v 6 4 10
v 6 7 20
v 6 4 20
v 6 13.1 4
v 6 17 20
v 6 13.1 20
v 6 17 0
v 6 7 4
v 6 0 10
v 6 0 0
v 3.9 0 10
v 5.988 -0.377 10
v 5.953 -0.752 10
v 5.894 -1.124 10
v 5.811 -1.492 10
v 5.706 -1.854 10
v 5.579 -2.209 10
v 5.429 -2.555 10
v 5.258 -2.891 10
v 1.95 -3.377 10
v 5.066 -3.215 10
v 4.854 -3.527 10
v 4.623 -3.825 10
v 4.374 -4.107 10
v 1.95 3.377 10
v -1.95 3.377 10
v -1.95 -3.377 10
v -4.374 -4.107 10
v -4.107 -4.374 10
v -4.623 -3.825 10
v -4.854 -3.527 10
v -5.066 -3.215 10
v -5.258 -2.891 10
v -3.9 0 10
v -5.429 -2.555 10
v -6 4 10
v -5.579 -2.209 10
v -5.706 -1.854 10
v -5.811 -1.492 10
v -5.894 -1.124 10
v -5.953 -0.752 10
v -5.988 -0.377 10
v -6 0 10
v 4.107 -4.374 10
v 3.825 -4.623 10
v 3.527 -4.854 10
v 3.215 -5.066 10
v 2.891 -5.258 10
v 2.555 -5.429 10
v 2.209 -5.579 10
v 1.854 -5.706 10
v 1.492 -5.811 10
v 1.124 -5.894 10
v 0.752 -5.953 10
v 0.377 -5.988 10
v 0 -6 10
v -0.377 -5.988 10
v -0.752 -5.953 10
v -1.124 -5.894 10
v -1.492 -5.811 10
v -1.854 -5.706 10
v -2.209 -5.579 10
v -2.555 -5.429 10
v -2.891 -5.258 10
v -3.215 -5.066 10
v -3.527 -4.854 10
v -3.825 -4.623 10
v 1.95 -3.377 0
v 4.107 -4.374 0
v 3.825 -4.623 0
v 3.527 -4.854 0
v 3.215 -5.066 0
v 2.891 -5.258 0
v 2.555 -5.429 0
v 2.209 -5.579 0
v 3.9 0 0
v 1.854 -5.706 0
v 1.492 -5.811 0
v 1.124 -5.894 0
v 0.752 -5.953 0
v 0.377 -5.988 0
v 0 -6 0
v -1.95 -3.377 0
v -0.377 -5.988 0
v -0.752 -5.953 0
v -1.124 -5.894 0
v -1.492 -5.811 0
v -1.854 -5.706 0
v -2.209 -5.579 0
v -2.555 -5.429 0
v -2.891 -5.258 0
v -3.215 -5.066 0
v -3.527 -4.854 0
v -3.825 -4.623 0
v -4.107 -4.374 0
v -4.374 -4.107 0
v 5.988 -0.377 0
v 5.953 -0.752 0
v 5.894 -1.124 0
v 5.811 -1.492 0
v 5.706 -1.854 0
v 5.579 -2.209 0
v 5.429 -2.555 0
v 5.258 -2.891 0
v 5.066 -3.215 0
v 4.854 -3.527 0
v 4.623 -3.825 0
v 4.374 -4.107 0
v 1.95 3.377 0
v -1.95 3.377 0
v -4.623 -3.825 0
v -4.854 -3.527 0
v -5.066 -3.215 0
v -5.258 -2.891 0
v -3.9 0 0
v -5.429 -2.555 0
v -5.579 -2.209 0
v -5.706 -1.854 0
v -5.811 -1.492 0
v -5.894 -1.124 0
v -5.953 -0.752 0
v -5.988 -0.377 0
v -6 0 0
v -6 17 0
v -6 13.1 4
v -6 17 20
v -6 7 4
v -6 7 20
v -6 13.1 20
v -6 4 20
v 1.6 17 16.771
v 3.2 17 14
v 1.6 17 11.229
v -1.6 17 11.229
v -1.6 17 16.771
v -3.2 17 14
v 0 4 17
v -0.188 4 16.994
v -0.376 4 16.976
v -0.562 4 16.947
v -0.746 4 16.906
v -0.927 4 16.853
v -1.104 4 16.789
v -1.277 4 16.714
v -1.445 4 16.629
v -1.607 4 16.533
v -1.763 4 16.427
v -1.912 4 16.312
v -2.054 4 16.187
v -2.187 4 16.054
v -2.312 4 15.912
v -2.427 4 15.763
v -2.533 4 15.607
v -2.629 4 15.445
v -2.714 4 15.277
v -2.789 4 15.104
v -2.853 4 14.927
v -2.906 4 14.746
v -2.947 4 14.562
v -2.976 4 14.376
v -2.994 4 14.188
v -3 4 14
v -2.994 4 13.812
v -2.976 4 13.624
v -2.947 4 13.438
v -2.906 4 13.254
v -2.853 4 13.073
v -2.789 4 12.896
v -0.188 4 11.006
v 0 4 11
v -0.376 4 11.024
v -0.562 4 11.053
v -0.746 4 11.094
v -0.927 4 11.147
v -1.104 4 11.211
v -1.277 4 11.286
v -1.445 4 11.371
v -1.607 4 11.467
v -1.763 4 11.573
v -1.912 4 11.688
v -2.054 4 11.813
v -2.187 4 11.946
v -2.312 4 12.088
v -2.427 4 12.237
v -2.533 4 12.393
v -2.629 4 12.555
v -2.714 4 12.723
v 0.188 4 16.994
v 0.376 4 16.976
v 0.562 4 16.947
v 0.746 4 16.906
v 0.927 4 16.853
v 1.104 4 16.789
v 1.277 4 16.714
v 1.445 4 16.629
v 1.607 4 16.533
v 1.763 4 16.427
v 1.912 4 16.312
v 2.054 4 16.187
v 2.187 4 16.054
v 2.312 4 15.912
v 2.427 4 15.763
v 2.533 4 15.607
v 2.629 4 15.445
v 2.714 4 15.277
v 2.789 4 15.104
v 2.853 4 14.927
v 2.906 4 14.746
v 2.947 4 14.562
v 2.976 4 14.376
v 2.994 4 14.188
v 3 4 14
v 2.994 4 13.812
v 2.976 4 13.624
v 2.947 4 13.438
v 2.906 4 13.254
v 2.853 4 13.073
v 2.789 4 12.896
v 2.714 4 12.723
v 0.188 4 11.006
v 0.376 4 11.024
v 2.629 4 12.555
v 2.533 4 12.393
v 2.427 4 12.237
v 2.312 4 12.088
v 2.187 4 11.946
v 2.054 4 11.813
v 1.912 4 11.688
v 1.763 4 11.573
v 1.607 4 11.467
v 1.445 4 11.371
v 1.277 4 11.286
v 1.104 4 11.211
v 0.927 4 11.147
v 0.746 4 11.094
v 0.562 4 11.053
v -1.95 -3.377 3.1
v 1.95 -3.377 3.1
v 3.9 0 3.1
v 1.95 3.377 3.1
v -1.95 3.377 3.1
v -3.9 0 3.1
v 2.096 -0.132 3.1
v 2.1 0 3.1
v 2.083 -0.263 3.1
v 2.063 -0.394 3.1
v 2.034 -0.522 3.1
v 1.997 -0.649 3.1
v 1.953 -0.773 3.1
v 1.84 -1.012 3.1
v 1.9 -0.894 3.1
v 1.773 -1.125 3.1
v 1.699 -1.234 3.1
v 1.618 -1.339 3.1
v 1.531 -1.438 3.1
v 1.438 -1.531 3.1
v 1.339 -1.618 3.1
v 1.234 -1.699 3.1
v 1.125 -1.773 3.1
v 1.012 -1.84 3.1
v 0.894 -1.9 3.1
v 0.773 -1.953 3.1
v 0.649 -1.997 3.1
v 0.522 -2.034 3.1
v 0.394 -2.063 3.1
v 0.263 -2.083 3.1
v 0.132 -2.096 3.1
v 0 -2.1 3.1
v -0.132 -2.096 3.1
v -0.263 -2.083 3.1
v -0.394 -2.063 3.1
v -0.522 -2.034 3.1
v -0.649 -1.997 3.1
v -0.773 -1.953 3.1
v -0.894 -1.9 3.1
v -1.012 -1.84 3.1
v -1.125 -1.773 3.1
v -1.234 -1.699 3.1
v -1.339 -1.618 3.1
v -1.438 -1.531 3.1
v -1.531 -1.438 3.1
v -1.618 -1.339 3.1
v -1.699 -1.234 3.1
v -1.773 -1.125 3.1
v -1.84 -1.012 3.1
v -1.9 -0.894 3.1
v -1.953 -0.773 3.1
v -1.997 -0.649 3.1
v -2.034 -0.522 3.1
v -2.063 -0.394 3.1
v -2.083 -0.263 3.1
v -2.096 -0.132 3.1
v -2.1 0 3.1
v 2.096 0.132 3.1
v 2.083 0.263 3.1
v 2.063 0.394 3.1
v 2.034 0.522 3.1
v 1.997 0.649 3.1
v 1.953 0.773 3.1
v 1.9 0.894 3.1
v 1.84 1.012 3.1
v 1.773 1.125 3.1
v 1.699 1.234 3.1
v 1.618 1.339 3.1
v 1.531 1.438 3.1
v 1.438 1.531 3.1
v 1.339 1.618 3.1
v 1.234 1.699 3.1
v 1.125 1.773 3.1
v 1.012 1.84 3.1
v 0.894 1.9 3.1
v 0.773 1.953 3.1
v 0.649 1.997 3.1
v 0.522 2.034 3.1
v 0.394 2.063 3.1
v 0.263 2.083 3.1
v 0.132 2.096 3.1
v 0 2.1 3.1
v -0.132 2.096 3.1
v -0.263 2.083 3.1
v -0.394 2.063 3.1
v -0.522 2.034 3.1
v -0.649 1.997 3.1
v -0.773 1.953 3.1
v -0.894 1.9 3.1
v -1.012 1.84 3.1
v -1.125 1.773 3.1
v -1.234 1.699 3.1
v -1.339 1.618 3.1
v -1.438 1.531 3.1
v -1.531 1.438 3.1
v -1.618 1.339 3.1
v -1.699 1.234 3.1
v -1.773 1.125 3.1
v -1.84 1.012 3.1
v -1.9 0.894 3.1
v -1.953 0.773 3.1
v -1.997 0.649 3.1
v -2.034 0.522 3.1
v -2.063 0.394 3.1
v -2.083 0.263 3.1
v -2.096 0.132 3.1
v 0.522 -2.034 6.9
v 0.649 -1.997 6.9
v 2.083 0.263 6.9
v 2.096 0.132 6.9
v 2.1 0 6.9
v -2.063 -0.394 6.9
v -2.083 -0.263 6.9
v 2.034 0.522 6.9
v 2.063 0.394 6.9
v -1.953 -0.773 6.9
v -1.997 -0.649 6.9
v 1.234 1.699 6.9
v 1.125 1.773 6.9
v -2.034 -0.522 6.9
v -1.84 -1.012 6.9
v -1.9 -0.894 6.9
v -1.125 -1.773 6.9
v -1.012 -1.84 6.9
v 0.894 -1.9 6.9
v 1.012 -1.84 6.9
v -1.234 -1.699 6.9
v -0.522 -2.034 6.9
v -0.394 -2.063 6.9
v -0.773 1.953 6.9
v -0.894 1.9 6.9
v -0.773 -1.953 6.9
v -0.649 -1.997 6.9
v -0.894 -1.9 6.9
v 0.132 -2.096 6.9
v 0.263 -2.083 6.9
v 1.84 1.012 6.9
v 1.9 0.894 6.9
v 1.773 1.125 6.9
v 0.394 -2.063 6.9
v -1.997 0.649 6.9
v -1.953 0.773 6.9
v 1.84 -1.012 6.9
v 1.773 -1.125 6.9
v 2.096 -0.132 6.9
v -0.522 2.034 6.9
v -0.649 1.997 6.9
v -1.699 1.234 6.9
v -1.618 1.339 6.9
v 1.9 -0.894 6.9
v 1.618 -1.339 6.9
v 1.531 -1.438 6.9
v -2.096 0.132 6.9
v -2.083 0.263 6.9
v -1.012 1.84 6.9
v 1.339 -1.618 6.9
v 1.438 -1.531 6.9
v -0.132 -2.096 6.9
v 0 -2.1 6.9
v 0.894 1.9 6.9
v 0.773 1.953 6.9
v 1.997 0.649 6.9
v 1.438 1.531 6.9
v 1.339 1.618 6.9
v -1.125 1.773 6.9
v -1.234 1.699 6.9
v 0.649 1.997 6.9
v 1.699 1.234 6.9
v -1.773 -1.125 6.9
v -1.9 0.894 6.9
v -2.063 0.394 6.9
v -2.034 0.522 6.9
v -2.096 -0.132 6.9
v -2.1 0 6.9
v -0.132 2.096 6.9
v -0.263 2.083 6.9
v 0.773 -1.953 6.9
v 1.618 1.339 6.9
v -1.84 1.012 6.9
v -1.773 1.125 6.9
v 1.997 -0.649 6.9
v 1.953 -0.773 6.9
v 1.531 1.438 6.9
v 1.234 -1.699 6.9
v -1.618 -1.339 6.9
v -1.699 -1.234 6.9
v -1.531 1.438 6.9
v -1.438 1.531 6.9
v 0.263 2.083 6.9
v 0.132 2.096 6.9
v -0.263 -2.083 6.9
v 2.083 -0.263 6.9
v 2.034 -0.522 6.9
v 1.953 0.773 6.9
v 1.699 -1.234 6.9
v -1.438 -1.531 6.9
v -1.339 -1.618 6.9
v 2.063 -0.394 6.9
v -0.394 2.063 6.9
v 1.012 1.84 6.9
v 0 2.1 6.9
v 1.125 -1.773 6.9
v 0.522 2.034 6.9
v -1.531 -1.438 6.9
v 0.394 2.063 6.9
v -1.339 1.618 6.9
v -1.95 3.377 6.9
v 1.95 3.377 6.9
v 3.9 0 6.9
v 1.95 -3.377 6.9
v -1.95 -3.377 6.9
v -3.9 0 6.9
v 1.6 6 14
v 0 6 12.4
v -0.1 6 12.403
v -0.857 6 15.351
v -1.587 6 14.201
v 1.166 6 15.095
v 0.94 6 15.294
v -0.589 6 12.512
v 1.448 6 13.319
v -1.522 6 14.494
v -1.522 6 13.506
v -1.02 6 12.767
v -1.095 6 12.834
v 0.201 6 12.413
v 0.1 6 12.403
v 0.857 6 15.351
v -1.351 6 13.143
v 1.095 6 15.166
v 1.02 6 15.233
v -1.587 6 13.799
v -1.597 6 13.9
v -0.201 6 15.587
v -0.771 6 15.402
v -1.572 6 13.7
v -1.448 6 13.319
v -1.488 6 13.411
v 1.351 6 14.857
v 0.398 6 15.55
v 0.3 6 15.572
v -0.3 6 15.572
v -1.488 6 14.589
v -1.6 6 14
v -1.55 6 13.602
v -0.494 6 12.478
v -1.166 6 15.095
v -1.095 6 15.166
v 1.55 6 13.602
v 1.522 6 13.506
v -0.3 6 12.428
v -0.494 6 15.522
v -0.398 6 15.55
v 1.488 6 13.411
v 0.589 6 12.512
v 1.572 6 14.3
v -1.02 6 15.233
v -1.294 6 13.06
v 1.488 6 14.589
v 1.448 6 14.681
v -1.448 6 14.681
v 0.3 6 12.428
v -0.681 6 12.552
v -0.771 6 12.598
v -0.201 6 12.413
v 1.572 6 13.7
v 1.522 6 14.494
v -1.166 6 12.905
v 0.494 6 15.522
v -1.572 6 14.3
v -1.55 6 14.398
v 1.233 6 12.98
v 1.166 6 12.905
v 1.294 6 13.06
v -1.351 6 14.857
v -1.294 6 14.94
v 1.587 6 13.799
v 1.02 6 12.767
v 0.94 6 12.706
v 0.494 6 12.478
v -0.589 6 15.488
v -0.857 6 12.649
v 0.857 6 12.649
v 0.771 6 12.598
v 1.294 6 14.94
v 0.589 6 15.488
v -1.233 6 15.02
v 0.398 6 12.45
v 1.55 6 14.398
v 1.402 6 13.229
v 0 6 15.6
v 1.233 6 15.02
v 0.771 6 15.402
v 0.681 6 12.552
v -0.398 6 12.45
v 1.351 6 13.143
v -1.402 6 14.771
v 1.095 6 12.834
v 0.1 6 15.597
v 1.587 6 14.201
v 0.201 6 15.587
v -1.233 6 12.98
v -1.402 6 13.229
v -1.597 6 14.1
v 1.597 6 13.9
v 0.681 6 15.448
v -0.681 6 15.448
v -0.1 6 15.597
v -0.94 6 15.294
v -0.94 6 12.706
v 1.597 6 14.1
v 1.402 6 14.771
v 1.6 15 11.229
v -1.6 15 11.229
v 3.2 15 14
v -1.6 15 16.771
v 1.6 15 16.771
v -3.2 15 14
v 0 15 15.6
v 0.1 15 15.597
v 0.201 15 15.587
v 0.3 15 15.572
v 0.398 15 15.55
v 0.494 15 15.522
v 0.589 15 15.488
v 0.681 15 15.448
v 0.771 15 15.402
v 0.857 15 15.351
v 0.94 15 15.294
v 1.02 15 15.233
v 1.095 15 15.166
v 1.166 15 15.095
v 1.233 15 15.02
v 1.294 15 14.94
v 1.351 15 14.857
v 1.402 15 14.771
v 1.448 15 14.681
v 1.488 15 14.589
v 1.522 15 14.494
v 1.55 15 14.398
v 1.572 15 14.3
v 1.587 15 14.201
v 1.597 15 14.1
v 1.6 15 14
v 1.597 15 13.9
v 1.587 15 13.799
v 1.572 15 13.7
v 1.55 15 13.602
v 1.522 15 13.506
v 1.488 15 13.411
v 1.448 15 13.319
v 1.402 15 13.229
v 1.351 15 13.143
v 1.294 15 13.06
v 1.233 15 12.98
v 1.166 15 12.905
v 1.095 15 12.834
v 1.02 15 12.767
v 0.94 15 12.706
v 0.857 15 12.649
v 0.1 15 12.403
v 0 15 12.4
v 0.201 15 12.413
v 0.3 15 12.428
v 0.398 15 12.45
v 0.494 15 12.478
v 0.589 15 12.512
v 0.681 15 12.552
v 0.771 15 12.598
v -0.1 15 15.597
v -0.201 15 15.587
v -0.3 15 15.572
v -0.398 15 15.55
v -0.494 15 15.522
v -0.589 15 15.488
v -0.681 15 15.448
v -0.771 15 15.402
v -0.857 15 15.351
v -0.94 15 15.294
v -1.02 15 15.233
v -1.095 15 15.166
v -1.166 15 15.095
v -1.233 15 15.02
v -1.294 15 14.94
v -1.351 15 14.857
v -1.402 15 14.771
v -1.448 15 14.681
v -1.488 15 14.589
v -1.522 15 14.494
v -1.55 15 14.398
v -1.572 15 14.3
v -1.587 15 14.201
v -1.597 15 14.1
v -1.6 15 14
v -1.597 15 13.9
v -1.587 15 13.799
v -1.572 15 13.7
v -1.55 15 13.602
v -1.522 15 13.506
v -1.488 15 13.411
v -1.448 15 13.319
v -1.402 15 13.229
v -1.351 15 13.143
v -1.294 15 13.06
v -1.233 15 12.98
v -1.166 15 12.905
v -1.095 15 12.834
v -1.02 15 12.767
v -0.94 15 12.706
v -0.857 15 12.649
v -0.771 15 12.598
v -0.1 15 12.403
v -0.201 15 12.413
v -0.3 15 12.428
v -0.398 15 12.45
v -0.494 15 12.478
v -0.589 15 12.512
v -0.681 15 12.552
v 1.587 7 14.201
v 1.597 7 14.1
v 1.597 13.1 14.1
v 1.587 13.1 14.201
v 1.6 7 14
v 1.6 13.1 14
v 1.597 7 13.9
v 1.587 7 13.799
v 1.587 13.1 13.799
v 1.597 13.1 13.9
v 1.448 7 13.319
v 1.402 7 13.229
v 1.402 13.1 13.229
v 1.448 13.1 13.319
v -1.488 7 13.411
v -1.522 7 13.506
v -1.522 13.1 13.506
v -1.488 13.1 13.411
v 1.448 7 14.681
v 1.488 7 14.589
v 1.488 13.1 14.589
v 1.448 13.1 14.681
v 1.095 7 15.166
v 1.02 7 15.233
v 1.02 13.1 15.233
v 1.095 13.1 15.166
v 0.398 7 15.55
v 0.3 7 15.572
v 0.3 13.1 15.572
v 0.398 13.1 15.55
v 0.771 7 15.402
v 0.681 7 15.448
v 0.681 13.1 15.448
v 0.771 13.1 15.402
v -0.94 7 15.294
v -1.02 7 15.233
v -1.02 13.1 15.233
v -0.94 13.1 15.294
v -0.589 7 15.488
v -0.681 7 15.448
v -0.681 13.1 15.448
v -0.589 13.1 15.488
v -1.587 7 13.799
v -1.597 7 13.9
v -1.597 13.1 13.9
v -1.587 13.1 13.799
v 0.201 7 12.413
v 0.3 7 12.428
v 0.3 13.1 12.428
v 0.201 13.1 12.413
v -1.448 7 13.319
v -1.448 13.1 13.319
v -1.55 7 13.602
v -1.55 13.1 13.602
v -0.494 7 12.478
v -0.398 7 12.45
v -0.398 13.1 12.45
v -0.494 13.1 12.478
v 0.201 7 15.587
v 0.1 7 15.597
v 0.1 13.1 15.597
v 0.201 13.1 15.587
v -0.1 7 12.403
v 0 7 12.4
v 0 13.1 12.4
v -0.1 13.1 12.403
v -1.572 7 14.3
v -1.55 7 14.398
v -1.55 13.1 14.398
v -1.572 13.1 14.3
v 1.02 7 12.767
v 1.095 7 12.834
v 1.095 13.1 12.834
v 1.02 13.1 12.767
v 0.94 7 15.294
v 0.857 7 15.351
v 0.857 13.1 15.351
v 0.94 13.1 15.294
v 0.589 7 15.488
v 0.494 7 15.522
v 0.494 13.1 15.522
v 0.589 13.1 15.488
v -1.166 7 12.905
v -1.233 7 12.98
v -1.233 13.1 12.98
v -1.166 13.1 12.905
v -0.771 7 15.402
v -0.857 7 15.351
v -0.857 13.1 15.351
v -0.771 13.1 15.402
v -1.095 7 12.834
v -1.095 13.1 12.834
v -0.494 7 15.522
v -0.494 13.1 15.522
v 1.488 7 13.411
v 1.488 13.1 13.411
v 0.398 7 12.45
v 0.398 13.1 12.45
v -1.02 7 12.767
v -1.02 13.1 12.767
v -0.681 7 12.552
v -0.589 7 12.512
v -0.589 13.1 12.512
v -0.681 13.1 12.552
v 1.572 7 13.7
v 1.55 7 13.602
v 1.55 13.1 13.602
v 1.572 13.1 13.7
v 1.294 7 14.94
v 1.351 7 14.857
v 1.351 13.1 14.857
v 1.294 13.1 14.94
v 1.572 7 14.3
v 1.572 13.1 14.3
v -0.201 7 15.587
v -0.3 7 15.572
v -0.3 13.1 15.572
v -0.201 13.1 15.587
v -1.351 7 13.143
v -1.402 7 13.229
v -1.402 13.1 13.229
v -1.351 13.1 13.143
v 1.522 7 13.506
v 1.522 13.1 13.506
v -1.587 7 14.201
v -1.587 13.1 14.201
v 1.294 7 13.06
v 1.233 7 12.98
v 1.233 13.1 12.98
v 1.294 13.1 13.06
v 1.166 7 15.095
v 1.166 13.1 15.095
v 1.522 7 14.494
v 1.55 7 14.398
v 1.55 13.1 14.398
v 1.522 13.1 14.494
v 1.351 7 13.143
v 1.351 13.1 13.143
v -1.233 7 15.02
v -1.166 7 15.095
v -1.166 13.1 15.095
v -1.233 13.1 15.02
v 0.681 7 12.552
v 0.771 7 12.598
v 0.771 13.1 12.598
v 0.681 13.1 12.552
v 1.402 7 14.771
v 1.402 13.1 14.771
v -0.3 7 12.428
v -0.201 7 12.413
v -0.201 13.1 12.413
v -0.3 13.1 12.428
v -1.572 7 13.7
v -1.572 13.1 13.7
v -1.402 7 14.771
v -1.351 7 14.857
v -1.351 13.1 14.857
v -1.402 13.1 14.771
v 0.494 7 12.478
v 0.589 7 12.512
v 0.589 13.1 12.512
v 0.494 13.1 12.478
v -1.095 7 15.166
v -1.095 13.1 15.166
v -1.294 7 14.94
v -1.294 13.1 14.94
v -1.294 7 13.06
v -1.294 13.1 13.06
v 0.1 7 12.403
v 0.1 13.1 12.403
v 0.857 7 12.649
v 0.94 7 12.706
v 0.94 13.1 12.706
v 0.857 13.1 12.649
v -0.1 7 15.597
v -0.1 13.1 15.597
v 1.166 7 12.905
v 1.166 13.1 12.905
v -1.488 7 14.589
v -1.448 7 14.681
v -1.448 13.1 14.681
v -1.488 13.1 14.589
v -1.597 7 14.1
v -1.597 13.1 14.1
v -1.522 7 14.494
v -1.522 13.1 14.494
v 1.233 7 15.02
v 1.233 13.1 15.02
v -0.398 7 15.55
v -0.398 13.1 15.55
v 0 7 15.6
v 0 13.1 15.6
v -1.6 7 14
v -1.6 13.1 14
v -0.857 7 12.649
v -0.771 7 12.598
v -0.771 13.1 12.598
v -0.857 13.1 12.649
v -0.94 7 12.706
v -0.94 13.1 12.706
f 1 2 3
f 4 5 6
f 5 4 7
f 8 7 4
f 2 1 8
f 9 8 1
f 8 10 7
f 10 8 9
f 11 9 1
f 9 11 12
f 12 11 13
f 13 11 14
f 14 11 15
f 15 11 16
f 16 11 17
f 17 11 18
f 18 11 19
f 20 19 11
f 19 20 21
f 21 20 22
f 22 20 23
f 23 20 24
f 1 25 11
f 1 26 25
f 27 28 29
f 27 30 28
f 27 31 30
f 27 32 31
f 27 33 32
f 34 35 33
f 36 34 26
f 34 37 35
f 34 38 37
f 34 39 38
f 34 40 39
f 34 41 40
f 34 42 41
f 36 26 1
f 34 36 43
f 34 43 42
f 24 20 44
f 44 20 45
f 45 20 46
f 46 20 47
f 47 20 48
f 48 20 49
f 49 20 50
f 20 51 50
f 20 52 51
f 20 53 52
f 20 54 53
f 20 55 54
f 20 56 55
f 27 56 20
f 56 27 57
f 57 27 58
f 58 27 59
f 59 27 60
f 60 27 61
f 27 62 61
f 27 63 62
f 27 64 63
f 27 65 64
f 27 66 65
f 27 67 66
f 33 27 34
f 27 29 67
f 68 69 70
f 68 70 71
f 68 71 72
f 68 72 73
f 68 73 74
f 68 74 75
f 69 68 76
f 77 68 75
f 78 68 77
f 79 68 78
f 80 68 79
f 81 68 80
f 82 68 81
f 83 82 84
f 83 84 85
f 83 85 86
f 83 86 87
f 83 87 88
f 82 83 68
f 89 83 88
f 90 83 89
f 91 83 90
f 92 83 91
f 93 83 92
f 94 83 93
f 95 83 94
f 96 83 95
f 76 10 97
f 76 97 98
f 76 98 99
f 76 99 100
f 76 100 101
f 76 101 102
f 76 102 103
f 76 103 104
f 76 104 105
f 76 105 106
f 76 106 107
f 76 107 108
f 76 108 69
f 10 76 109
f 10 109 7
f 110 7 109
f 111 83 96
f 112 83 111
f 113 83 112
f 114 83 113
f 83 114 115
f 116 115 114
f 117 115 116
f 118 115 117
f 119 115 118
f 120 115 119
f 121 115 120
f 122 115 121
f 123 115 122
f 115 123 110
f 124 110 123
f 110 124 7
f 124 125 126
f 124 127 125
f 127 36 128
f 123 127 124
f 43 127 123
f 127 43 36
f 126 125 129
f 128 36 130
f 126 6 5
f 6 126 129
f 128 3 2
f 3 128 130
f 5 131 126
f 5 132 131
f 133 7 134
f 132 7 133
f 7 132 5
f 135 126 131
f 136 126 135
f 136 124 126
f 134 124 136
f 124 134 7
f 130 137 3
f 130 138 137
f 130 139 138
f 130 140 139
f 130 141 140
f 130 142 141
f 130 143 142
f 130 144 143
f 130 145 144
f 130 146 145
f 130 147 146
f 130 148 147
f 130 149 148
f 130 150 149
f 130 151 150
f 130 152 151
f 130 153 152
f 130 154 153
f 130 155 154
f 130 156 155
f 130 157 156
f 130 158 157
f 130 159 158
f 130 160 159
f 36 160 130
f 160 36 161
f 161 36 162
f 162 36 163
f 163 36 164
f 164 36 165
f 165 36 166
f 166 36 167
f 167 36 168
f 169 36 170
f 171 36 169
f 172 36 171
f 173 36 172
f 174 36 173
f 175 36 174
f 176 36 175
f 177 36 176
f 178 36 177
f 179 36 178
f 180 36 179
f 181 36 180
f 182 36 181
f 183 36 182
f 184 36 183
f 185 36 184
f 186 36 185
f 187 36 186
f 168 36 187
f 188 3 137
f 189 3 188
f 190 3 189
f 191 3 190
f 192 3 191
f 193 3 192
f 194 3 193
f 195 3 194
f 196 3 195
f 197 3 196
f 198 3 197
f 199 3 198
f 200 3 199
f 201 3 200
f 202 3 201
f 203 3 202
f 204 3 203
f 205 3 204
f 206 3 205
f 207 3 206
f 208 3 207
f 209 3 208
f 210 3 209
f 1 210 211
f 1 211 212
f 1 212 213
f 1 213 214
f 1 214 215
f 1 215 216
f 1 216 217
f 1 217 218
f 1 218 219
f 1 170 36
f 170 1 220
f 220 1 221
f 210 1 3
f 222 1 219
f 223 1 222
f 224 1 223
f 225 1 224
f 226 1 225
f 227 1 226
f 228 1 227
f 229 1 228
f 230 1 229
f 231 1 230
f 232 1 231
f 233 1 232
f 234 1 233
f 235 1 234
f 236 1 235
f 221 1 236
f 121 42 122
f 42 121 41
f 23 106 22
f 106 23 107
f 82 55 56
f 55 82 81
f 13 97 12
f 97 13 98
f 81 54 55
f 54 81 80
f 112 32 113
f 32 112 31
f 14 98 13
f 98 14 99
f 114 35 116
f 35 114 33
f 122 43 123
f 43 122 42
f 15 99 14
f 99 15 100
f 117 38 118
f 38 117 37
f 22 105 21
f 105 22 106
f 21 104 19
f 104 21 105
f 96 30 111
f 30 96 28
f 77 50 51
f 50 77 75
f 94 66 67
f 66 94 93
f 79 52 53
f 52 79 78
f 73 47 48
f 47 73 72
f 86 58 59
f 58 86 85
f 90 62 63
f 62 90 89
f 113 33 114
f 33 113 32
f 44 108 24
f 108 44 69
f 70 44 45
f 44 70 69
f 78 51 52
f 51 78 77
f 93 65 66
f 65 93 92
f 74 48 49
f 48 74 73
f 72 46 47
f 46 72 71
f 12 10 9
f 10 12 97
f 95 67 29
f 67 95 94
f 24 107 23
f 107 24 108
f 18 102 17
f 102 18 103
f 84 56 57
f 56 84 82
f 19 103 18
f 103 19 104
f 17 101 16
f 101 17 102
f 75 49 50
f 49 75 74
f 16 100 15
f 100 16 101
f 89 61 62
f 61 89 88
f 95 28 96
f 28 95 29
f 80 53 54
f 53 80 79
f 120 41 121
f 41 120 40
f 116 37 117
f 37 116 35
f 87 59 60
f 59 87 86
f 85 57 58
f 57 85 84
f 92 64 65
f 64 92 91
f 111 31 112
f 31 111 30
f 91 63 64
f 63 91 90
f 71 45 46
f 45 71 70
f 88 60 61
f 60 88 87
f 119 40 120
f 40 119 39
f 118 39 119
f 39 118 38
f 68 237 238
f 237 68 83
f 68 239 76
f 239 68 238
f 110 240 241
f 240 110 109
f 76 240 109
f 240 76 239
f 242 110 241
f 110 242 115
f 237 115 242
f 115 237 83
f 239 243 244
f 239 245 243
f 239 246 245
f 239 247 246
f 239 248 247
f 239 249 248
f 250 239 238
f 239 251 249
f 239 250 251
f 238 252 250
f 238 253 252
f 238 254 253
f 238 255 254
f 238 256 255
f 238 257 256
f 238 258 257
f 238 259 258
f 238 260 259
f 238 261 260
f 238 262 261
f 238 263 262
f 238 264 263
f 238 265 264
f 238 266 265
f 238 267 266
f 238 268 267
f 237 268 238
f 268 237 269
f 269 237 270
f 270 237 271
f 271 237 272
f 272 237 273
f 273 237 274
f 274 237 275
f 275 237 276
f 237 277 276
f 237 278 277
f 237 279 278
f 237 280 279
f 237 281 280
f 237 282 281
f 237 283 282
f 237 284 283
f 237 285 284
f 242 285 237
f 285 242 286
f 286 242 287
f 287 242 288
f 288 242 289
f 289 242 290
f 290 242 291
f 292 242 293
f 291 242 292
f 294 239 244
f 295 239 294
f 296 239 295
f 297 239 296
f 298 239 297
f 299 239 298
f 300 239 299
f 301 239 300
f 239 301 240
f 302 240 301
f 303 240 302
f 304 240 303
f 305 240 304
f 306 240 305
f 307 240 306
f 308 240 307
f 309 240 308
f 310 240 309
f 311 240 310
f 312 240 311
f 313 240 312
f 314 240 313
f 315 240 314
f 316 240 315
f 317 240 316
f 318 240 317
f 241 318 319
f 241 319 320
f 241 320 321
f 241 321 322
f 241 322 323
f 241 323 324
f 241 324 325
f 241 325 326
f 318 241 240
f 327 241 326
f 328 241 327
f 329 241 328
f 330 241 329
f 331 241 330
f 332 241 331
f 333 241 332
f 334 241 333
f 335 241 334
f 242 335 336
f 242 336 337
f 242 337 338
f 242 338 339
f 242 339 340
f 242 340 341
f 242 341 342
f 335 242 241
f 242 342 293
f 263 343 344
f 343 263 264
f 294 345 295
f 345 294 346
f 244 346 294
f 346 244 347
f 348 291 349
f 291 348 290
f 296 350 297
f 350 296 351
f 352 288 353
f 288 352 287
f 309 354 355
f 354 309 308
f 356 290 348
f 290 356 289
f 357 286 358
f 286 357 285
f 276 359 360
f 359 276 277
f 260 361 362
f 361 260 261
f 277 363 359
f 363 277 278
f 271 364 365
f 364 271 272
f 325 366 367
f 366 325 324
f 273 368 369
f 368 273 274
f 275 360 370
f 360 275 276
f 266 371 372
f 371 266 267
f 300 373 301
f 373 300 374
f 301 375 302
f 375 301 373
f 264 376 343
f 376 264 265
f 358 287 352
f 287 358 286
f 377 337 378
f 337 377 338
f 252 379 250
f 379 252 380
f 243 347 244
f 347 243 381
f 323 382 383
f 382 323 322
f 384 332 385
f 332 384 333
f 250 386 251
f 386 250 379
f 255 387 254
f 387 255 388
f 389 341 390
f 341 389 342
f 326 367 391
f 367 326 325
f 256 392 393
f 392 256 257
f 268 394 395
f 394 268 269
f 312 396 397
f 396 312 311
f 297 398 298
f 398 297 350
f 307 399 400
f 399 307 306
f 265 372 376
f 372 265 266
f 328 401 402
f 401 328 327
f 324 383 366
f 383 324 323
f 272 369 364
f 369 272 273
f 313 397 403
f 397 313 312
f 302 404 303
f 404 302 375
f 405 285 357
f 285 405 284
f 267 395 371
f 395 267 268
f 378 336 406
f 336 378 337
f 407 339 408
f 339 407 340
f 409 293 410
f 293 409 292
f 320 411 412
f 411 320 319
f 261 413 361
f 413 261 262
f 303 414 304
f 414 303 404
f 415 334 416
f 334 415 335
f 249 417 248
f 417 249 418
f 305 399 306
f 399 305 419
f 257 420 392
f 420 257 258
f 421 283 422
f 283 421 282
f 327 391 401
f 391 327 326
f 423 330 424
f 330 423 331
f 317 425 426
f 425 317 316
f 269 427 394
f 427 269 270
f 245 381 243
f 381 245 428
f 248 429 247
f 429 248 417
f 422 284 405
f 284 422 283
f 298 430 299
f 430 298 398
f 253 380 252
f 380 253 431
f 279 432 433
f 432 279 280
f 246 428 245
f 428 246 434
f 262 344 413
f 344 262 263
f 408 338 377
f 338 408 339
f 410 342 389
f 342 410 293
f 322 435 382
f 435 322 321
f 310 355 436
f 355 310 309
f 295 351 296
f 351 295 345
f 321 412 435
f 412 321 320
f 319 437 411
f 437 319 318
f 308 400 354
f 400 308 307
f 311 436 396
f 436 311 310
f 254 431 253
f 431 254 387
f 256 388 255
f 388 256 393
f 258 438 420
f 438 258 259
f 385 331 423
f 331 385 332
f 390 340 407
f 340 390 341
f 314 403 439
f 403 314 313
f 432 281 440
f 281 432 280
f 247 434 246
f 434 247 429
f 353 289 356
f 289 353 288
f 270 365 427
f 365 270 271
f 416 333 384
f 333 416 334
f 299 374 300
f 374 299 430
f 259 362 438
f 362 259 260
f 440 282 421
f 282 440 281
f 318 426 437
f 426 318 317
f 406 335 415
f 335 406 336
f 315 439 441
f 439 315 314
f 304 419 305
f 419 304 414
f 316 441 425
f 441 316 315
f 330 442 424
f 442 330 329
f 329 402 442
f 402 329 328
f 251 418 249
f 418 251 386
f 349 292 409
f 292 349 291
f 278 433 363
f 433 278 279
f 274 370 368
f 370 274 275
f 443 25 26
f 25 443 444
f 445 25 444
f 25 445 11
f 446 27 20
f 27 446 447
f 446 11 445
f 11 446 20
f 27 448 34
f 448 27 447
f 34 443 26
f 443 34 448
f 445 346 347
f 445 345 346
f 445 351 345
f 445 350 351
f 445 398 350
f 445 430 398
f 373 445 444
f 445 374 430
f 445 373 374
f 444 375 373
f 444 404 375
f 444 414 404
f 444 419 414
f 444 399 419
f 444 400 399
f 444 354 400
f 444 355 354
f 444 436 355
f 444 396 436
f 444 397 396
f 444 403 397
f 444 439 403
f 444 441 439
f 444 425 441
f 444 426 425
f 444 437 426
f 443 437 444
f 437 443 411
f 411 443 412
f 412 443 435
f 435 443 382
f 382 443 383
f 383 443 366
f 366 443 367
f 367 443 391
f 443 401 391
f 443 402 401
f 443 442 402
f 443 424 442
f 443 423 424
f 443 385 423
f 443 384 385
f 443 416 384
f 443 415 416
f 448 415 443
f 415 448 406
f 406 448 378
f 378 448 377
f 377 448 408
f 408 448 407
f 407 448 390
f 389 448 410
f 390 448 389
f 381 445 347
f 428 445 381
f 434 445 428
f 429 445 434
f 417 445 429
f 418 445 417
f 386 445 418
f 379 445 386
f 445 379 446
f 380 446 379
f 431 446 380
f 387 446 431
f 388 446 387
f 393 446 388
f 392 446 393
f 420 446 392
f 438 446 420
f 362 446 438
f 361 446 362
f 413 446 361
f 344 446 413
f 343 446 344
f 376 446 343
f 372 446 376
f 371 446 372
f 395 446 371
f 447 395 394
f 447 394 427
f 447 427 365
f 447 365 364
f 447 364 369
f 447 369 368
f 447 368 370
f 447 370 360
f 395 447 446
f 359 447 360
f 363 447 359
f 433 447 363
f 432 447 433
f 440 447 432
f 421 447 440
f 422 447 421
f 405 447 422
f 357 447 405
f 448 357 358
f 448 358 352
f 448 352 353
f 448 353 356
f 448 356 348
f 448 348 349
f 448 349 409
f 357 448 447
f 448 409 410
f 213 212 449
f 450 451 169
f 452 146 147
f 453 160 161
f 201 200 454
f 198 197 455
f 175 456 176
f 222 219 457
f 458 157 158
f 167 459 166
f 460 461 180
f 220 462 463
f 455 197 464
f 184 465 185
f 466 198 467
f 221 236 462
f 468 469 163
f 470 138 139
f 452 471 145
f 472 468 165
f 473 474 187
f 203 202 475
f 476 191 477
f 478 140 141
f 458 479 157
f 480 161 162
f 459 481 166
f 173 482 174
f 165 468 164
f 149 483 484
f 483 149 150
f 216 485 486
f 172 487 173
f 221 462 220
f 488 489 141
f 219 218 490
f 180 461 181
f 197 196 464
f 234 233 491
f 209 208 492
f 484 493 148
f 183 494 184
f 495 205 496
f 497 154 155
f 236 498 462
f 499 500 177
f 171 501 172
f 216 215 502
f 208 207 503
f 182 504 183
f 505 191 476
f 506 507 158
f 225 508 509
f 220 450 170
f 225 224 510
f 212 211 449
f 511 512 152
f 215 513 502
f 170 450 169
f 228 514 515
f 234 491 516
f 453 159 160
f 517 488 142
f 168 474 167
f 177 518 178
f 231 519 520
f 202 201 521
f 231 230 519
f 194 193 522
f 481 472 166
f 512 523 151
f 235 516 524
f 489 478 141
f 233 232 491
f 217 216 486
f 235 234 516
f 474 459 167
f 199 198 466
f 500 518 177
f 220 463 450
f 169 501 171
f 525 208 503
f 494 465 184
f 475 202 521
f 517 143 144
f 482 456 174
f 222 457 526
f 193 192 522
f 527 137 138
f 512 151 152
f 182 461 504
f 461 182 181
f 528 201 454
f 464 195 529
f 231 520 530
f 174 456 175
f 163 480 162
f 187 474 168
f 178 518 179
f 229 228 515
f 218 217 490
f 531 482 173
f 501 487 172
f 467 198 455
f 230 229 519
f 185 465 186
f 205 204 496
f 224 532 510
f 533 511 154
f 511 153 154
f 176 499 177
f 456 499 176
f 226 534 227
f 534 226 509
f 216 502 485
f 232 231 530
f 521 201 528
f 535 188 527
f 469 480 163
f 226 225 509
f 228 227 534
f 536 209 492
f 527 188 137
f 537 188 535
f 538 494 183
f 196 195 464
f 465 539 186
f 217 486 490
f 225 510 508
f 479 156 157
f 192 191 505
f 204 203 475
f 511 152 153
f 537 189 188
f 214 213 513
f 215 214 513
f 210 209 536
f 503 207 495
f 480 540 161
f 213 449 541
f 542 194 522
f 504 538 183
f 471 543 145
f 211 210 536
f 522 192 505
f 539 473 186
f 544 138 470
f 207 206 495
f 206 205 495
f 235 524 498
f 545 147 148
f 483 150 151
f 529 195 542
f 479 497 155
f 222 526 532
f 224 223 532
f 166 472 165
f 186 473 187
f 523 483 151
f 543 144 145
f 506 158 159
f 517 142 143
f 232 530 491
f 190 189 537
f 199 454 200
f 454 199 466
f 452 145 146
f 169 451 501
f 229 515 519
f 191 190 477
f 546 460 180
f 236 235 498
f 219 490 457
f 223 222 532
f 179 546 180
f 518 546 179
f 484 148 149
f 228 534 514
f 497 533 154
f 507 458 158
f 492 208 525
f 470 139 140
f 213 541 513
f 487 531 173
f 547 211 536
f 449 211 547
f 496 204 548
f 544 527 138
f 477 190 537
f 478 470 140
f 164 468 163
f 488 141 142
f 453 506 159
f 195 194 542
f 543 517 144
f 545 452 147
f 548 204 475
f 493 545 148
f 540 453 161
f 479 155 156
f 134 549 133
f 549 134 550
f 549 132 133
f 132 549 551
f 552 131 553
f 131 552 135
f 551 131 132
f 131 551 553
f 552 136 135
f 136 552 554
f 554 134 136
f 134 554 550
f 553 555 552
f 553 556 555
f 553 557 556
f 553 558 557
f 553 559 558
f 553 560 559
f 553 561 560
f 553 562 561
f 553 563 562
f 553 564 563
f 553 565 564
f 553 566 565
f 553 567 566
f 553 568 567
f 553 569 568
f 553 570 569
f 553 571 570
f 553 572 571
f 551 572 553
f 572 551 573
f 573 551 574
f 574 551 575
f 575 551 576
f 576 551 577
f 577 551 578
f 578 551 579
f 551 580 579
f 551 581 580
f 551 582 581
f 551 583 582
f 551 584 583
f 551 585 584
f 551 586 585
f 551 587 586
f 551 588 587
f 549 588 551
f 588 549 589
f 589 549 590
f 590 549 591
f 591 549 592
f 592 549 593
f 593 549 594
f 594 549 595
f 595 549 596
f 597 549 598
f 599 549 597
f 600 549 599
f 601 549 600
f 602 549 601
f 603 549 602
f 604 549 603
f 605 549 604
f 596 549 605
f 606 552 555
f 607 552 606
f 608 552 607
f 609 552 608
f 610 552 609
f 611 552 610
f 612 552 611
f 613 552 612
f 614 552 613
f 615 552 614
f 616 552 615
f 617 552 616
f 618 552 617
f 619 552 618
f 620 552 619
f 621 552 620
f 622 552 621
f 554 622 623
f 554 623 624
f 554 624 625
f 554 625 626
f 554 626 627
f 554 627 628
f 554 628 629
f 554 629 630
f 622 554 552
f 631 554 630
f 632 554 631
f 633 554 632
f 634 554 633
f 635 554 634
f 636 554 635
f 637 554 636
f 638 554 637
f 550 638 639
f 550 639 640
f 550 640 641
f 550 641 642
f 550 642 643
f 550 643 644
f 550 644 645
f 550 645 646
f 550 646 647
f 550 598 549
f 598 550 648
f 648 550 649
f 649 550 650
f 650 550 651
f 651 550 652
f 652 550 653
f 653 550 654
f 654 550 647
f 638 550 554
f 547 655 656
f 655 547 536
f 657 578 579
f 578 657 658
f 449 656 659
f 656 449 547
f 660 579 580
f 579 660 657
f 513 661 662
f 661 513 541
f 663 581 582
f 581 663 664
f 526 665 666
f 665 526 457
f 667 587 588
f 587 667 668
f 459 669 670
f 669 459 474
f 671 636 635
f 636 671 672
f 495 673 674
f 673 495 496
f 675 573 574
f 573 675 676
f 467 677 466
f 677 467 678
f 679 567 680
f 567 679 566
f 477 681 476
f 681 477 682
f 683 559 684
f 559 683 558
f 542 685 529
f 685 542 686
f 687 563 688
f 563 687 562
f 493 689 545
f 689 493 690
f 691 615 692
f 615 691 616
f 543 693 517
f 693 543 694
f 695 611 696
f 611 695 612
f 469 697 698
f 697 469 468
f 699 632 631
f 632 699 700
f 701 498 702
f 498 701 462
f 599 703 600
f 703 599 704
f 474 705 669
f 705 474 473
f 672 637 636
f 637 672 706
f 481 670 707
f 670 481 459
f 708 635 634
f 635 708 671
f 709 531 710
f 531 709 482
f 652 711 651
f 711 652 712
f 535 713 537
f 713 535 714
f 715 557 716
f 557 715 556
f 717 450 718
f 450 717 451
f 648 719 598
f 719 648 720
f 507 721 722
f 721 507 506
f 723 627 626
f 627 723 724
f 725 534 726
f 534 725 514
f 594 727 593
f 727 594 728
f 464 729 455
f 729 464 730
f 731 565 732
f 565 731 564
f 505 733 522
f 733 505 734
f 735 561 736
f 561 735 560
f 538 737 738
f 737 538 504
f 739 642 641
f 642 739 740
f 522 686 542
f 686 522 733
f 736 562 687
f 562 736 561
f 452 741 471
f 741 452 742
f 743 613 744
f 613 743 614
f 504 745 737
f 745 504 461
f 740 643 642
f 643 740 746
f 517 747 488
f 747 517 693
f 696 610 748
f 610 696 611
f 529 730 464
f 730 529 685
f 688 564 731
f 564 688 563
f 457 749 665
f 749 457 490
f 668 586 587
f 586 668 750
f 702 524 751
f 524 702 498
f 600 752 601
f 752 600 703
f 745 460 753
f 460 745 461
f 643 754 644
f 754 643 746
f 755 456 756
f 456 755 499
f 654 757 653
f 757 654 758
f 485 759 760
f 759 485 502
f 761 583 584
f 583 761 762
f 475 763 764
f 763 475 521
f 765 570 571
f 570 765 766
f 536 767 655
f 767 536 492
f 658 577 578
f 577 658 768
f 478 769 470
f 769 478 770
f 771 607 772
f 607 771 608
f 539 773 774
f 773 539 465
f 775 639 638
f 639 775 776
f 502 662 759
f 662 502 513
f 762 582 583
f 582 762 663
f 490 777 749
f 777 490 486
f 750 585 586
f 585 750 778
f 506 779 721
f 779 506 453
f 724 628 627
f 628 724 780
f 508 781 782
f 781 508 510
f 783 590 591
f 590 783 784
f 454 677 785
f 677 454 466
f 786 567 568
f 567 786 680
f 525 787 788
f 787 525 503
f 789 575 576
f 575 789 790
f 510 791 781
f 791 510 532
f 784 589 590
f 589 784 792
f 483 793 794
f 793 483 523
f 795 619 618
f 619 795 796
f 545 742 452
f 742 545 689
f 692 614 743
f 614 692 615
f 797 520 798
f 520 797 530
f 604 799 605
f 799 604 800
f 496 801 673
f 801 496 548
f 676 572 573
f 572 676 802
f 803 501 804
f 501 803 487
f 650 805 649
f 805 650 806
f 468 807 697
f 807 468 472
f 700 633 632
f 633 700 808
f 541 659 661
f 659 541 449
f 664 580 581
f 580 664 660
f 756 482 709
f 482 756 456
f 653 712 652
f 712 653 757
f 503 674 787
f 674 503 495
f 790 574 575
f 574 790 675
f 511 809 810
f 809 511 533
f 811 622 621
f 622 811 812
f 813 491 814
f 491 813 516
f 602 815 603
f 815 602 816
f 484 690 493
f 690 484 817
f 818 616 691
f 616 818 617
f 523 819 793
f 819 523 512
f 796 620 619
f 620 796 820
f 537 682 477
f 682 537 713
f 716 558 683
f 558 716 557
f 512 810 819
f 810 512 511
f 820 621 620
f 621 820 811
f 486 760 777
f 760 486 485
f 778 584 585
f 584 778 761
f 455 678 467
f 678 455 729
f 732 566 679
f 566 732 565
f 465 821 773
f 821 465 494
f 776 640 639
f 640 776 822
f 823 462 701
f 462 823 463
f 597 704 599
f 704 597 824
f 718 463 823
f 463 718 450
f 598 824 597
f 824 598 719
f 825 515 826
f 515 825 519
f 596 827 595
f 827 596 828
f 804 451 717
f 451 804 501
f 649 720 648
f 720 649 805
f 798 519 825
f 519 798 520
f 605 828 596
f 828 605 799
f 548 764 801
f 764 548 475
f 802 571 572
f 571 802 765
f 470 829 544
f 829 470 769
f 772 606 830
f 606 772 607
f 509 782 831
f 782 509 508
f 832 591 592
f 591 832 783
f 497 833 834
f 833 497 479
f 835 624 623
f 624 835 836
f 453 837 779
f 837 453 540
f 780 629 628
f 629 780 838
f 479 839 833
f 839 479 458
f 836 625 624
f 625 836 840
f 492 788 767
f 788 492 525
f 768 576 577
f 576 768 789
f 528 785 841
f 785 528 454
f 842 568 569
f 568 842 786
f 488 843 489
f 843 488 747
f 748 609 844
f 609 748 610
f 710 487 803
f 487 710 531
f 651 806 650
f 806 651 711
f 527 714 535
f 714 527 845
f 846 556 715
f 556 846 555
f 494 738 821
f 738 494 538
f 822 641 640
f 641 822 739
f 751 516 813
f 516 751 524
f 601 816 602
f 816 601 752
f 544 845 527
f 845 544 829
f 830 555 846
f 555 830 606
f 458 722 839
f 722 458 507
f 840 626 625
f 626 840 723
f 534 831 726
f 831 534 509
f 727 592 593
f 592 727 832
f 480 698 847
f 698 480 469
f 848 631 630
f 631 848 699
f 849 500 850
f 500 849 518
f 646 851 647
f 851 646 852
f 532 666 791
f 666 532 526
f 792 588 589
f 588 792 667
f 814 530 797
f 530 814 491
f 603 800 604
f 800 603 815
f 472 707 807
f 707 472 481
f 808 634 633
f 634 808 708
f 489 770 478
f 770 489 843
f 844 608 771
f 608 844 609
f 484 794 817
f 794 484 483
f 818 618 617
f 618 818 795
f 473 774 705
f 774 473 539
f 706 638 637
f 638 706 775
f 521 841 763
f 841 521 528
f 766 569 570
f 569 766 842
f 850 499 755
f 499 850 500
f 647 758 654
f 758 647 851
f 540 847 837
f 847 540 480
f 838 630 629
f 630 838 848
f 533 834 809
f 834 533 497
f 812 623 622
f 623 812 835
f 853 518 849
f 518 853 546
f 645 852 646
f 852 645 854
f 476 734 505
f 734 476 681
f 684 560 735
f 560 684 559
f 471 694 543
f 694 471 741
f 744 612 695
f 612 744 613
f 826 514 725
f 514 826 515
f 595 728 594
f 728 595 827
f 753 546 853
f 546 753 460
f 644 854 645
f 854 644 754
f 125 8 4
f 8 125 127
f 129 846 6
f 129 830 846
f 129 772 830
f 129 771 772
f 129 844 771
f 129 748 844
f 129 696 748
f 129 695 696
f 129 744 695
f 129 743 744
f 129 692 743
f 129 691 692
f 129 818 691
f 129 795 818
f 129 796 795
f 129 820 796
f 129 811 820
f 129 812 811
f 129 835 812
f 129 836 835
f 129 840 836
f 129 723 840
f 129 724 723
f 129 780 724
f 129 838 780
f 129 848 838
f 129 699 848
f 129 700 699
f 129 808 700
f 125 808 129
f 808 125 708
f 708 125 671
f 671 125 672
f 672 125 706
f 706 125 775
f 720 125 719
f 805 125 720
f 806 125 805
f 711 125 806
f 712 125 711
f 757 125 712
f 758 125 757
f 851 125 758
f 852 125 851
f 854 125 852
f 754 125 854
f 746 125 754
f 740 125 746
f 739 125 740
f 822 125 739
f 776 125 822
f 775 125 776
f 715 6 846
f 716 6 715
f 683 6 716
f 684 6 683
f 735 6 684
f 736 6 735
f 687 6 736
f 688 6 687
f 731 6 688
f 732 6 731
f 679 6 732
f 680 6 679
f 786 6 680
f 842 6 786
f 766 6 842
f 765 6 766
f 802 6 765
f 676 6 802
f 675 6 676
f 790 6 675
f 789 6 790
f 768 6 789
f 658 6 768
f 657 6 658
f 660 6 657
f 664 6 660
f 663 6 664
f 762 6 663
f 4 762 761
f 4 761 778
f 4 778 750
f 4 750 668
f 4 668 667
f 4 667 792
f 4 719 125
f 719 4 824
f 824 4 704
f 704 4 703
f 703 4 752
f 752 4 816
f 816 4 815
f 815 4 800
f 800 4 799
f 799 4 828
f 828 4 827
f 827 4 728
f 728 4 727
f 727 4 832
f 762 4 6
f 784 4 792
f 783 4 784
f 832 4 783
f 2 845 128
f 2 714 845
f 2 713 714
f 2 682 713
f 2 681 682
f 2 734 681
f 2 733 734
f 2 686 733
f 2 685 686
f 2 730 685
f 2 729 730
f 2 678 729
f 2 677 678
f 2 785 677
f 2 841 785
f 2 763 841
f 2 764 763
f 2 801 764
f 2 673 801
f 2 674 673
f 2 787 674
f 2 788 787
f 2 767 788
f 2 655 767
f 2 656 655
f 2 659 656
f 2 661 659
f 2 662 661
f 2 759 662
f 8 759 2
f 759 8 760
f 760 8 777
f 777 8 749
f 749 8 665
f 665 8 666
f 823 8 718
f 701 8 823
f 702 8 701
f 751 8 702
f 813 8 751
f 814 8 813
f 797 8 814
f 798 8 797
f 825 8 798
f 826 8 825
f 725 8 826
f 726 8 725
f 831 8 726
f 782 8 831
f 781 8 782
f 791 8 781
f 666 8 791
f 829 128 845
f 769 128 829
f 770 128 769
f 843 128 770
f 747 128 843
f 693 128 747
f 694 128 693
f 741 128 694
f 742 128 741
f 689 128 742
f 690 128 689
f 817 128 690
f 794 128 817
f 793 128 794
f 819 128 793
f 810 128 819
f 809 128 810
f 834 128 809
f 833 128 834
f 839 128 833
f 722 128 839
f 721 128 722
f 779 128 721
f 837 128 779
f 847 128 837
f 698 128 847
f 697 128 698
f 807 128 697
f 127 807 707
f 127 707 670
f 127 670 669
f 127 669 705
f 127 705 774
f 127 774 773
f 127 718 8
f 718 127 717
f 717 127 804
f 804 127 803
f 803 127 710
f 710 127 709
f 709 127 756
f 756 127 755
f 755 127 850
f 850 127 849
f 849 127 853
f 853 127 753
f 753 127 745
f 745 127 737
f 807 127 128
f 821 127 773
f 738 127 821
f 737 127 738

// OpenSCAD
d=12;
w_p=6.1;

module m4_hole(){
    translate([0,0,-1.9])cylinder(r=7.8/2, h=5, $fn=6);
    cylinder(r=2.1,h=30, $fn=100);
}

module m3_hole(){
    translate([0,0,-2])cylinder(r=3.2, h=5, $fn=6);
    cylinder(r=1.6,h=30, $fn=100);
}


module m3_support(){
    cylinder(r=3,h=3, $fn=100);
    translate([0,0,3])cylinder(r1=3,r2=1.6,h=2, $fn=100);
}

module main(){
    difference(){
    union(){
        translate([-d/2,0,0])cube([d,d,d-2]);
        translate([-d/2,d/2-2,0])cube([d,d+1,d*2-4]);
        cylinder(r=d/2, h=d-2, $fn=100);
    }
        translate([0,0,d-2])rotate([180,0,0])m4_hole();
        m4_hole();
        translate([-d/2-1,d/2+1,4])cube([d*2,w_p,d*2]);
        translate([0,1,d+2])rotate([-90])m3_support();
        translate([0,d+6,d+2])rotate([90])m3_hole();
    }
}   
main();
